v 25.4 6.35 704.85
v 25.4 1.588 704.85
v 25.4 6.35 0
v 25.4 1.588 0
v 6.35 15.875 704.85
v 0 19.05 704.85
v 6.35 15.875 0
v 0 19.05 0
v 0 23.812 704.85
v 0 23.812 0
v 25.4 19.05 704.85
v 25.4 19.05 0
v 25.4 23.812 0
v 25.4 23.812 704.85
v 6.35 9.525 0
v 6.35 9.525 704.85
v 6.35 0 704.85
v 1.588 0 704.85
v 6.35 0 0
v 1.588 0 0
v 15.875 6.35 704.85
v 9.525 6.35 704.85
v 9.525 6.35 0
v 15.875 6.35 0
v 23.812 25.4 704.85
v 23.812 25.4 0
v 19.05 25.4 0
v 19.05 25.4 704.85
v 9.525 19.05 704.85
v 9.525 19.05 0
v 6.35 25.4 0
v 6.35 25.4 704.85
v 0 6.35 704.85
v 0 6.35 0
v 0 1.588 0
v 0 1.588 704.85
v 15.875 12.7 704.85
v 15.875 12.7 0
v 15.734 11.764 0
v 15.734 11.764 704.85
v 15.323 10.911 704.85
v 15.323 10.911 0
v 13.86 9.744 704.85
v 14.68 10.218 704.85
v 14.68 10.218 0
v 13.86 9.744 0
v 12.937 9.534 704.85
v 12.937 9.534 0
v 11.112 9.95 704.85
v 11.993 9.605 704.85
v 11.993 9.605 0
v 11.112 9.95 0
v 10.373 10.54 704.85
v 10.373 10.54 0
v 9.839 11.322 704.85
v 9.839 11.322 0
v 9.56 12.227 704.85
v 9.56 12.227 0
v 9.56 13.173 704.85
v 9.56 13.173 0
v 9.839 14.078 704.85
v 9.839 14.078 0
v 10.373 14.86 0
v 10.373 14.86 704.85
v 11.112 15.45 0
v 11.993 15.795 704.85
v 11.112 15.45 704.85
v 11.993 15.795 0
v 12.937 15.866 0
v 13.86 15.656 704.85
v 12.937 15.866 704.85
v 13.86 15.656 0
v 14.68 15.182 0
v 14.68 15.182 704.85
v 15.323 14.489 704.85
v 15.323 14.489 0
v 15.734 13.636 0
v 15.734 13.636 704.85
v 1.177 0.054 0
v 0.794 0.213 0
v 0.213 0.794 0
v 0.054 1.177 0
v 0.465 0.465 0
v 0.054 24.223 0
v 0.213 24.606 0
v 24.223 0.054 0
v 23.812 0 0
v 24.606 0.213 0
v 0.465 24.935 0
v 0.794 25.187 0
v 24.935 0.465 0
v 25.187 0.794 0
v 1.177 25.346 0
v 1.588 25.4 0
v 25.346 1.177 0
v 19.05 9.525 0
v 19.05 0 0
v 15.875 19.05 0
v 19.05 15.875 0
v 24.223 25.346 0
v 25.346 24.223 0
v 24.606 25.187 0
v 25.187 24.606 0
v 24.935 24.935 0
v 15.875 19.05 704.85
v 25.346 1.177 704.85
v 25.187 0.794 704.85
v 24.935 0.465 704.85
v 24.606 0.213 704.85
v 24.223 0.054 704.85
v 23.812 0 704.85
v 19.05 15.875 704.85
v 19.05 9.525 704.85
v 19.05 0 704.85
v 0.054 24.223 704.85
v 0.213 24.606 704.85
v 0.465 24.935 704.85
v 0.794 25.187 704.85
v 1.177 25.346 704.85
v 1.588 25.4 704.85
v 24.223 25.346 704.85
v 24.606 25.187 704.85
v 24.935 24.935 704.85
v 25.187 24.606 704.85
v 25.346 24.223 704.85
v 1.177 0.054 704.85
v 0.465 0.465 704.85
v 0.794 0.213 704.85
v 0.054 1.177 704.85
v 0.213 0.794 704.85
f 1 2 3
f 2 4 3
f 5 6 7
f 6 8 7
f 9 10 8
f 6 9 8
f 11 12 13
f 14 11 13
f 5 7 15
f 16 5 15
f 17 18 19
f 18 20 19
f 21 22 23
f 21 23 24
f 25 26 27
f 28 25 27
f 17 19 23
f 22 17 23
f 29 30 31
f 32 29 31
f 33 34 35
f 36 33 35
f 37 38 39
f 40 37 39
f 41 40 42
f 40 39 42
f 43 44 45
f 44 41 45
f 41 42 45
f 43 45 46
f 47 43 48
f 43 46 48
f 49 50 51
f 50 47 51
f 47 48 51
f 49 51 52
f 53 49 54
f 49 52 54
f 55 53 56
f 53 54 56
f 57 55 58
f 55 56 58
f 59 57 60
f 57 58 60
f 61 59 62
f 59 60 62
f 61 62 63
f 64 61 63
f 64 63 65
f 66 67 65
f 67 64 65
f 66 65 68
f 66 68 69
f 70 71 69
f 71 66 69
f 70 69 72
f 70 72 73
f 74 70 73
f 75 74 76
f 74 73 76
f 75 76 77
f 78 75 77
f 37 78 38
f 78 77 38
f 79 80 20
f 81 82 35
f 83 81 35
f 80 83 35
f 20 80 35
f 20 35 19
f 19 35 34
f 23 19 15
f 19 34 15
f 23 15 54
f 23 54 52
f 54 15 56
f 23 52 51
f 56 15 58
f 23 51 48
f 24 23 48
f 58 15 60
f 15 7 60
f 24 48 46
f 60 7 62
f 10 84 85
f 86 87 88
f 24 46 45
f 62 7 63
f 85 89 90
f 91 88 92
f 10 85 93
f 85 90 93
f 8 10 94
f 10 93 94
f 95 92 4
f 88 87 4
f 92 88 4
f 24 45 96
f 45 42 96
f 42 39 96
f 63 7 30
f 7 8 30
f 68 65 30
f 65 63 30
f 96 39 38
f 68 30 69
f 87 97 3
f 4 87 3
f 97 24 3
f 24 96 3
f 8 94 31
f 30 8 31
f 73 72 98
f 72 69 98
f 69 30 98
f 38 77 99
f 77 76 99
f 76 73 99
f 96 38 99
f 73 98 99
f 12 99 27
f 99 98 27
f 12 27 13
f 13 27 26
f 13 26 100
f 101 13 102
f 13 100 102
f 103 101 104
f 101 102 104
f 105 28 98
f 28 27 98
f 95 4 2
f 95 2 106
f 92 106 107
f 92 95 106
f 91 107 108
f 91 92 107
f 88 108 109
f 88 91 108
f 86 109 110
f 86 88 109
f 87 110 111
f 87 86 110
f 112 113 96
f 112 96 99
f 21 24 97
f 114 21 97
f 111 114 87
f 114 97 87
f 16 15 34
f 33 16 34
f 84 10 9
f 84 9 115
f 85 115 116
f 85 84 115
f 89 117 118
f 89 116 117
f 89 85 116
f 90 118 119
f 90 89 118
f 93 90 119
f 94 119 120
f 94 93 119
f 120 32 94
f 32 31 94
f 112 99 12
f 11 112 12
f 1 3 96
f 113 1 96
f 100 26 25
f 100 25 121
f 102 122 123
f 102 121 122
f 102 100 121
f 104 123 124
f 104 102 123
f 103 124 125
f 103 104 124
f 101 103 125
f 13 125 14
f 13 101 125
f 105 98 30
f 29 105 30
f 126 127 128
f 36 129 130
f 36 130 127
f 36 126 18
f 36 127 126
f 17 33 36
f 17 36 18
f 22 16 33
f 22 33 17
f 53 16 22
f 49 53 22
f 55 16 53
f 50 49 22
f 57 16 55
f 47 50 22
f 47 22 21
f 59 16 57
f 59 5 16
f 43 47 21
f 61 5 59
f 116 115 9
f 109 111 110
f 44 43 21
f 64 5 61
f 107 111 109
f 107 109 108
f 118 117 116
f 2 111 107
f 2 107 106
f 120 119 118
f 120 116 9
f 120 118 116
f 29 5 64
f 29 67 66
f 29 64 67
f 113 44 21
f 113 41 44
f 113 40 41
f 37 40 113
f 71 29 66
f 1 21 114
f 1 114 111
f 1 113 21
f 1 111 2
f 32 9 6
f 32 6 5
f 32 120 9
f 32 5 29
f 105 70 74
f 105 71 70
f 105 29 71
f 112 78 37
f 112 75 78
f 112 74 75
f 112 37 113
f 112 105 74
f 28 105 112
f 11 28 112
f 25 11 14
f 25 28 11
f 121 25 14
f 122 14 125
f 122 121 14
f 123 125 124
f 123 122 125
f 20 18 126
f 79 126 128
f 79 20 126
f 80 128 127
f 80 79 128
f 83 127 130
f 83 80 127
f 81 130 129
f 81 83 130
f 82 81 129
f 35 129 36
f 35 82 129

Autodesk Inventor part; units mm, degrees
ref_plane "YZ Plane" through (0, 0, 0) normal (1, 0, 0) x (0, 1, 0)
ref_plane "XZ Plane" through (0, 0, 0) normal (0, 1, 0) x (-1, 0, 0)
ref_plane "XY Plane" through (0, 0, 0) normal (0, 0, 1) x (1, 0, 0)
sketch "Sketch1" plane through (0, 0, 0) normal (0, 0, 1) x (1, 0, 0)
  line L0 (0, 0) -> (25.4, 0)
  line L1 (25.4, 0) -> (25.4, 25.4)
  line L2 (25.4, 25.4) -> (0, 25.4)
  line L3 (0, 25.4) -> (0, 0)
  circle A0 centre (12.7, 12.7) radius 3.175
  dimension "d0" = 25.4
  dimension "d1" = 25.4
  dimension "d2" = 6.35
  dimension "d7" = 12.7
  dimension "d8" = 12.7
extrude "Extrusion1" add sketch "Sketch1" along normal blind 609.6
sketch "Sketch2" plane through (0, 0, 609.6) normal (0, 0, 1) x (1, 0, 0)
  line L0 (25.4, 25.4) -> (0, 25.4) projected
  line L1 (0, 25.4) -> (0, 0) projected
  circle A0 centre (12.7, 12.7) radius 3.175 projected
  line L2 (0, 0) -> (25.4, 0) projected
  line L3 (25.4, 0) -> (25.4, 25.4) projected
  line L4 (25.4, 25.4) -> (0, 25.4) projected
  line L5 (0, 25.4) -> (0, 0) projected
  line L6 (12.7, 19.05) -> (9.525, 19.05)
  line L7 (9.525, 19.05) -> (15.875, 19.05)
  line L8 (15.875, 19.05) -> (19.05, 25.4)
  line L9 (9.525, 19.05) -> (6.35, 25.4)
  dimension "d13" = 6.35
  dimension "d14" = 6.35
  dimension "d15" = 3.175
  dimension "d16" = 6.35
fillet "Fillet1" radius 1.5875 4 edges at (25.4, 25.4, 304.8) (0, 25.4, 304.8) (25.4, 0, 304.8) (0, 0, 304.8)
extrude "Extrusion2" cut sketch "Sketch2" against normal blind 609.6 contours L8 L7 L6 L9 L0
pattern_circular "Circular Pattern1" count 4 over 360 about axis through (12.7, 12.7, 0) along (0, 0, 1) of "Extrusion2"
sketch "Sketch3" plane through (0, 0, 609.6) normal (0, 0, 1) x (1, 0, 0)
  line L0 (19.05, 15.875) -> (25.4, 19.05) projected
  line L1 (25.4, 19.05) -> (25.4, 23.8125) projected
  arc A0 (25.4, 23.8125) -> (23.8125, 25.4) centre (23.8125, 23.8125) ccw projected
  line L2 (23.8125, 25.4) -> (19.05, 25.4) projected
  line L3 (19.05, 25.4) -> (15.875, 19.05) projected
  line L4 (15.875, 19.05) -> (9.525, 19.05) projected
  line L5 (9.525, 19.05) -> (6.35, 25.4) projected
  line L6 (6.35, 25.4) -> (1.5875, 25.4) projected
  arc A1 (1.5875, 25.4) -> (0, 23.8125) centre (1.5875, 23.8125) ccw projected
  line L7 (0, 23.8125) -> (0, 19.05) projected
  line L8 (0, 19.05) -> (6.35, 15.875) projected
  line L9 (6.35, 15.875) -> (6.35, 9.525) projected
  line L10 (6.35, 9.525) -> (0, 6.35) projected
  line L11 (0, 6.35) -> (0, 1.5875) projected
  arc A2 (0, 1.5875) -> (1.5875, 0) centre (1.5875, 1.5875) ccw projected
  line L12 (1.5875, 0) -> (6.35, 0) projected
  line L13 (6.35, 0) -> (9.525, 6.35) projected
  line L14 (9.525, 6.35) -> (15.875, 6.35) projected
  line L15 (15.875, 6.35) -> (19.05, 0) projected
  line L16 (19.05, 0) -> (23.8125, 0) projected
  arc A3 (23.8125, 0) -> (25.4, 1.5875) centre (23.8125, 1.5875) ccw projected
  line L17 (25.4, 1.5875) -> (25.4, 6.35) projected
  line L18 (25.4, 6.35) -> (19.05, 9.525) projected
  line L19 (19.05, 9.525) -> (19.05, 15.875) projected
  circle A4 centre (12.7, 12.7) radius 3.175 projected
  point P0 (0, 0)
extrude "Extrusion3" add sketch "Sketch3" along normal blind 95.25
properties part number "Mock 8020 27.75in" material "Aluminum 6061"
